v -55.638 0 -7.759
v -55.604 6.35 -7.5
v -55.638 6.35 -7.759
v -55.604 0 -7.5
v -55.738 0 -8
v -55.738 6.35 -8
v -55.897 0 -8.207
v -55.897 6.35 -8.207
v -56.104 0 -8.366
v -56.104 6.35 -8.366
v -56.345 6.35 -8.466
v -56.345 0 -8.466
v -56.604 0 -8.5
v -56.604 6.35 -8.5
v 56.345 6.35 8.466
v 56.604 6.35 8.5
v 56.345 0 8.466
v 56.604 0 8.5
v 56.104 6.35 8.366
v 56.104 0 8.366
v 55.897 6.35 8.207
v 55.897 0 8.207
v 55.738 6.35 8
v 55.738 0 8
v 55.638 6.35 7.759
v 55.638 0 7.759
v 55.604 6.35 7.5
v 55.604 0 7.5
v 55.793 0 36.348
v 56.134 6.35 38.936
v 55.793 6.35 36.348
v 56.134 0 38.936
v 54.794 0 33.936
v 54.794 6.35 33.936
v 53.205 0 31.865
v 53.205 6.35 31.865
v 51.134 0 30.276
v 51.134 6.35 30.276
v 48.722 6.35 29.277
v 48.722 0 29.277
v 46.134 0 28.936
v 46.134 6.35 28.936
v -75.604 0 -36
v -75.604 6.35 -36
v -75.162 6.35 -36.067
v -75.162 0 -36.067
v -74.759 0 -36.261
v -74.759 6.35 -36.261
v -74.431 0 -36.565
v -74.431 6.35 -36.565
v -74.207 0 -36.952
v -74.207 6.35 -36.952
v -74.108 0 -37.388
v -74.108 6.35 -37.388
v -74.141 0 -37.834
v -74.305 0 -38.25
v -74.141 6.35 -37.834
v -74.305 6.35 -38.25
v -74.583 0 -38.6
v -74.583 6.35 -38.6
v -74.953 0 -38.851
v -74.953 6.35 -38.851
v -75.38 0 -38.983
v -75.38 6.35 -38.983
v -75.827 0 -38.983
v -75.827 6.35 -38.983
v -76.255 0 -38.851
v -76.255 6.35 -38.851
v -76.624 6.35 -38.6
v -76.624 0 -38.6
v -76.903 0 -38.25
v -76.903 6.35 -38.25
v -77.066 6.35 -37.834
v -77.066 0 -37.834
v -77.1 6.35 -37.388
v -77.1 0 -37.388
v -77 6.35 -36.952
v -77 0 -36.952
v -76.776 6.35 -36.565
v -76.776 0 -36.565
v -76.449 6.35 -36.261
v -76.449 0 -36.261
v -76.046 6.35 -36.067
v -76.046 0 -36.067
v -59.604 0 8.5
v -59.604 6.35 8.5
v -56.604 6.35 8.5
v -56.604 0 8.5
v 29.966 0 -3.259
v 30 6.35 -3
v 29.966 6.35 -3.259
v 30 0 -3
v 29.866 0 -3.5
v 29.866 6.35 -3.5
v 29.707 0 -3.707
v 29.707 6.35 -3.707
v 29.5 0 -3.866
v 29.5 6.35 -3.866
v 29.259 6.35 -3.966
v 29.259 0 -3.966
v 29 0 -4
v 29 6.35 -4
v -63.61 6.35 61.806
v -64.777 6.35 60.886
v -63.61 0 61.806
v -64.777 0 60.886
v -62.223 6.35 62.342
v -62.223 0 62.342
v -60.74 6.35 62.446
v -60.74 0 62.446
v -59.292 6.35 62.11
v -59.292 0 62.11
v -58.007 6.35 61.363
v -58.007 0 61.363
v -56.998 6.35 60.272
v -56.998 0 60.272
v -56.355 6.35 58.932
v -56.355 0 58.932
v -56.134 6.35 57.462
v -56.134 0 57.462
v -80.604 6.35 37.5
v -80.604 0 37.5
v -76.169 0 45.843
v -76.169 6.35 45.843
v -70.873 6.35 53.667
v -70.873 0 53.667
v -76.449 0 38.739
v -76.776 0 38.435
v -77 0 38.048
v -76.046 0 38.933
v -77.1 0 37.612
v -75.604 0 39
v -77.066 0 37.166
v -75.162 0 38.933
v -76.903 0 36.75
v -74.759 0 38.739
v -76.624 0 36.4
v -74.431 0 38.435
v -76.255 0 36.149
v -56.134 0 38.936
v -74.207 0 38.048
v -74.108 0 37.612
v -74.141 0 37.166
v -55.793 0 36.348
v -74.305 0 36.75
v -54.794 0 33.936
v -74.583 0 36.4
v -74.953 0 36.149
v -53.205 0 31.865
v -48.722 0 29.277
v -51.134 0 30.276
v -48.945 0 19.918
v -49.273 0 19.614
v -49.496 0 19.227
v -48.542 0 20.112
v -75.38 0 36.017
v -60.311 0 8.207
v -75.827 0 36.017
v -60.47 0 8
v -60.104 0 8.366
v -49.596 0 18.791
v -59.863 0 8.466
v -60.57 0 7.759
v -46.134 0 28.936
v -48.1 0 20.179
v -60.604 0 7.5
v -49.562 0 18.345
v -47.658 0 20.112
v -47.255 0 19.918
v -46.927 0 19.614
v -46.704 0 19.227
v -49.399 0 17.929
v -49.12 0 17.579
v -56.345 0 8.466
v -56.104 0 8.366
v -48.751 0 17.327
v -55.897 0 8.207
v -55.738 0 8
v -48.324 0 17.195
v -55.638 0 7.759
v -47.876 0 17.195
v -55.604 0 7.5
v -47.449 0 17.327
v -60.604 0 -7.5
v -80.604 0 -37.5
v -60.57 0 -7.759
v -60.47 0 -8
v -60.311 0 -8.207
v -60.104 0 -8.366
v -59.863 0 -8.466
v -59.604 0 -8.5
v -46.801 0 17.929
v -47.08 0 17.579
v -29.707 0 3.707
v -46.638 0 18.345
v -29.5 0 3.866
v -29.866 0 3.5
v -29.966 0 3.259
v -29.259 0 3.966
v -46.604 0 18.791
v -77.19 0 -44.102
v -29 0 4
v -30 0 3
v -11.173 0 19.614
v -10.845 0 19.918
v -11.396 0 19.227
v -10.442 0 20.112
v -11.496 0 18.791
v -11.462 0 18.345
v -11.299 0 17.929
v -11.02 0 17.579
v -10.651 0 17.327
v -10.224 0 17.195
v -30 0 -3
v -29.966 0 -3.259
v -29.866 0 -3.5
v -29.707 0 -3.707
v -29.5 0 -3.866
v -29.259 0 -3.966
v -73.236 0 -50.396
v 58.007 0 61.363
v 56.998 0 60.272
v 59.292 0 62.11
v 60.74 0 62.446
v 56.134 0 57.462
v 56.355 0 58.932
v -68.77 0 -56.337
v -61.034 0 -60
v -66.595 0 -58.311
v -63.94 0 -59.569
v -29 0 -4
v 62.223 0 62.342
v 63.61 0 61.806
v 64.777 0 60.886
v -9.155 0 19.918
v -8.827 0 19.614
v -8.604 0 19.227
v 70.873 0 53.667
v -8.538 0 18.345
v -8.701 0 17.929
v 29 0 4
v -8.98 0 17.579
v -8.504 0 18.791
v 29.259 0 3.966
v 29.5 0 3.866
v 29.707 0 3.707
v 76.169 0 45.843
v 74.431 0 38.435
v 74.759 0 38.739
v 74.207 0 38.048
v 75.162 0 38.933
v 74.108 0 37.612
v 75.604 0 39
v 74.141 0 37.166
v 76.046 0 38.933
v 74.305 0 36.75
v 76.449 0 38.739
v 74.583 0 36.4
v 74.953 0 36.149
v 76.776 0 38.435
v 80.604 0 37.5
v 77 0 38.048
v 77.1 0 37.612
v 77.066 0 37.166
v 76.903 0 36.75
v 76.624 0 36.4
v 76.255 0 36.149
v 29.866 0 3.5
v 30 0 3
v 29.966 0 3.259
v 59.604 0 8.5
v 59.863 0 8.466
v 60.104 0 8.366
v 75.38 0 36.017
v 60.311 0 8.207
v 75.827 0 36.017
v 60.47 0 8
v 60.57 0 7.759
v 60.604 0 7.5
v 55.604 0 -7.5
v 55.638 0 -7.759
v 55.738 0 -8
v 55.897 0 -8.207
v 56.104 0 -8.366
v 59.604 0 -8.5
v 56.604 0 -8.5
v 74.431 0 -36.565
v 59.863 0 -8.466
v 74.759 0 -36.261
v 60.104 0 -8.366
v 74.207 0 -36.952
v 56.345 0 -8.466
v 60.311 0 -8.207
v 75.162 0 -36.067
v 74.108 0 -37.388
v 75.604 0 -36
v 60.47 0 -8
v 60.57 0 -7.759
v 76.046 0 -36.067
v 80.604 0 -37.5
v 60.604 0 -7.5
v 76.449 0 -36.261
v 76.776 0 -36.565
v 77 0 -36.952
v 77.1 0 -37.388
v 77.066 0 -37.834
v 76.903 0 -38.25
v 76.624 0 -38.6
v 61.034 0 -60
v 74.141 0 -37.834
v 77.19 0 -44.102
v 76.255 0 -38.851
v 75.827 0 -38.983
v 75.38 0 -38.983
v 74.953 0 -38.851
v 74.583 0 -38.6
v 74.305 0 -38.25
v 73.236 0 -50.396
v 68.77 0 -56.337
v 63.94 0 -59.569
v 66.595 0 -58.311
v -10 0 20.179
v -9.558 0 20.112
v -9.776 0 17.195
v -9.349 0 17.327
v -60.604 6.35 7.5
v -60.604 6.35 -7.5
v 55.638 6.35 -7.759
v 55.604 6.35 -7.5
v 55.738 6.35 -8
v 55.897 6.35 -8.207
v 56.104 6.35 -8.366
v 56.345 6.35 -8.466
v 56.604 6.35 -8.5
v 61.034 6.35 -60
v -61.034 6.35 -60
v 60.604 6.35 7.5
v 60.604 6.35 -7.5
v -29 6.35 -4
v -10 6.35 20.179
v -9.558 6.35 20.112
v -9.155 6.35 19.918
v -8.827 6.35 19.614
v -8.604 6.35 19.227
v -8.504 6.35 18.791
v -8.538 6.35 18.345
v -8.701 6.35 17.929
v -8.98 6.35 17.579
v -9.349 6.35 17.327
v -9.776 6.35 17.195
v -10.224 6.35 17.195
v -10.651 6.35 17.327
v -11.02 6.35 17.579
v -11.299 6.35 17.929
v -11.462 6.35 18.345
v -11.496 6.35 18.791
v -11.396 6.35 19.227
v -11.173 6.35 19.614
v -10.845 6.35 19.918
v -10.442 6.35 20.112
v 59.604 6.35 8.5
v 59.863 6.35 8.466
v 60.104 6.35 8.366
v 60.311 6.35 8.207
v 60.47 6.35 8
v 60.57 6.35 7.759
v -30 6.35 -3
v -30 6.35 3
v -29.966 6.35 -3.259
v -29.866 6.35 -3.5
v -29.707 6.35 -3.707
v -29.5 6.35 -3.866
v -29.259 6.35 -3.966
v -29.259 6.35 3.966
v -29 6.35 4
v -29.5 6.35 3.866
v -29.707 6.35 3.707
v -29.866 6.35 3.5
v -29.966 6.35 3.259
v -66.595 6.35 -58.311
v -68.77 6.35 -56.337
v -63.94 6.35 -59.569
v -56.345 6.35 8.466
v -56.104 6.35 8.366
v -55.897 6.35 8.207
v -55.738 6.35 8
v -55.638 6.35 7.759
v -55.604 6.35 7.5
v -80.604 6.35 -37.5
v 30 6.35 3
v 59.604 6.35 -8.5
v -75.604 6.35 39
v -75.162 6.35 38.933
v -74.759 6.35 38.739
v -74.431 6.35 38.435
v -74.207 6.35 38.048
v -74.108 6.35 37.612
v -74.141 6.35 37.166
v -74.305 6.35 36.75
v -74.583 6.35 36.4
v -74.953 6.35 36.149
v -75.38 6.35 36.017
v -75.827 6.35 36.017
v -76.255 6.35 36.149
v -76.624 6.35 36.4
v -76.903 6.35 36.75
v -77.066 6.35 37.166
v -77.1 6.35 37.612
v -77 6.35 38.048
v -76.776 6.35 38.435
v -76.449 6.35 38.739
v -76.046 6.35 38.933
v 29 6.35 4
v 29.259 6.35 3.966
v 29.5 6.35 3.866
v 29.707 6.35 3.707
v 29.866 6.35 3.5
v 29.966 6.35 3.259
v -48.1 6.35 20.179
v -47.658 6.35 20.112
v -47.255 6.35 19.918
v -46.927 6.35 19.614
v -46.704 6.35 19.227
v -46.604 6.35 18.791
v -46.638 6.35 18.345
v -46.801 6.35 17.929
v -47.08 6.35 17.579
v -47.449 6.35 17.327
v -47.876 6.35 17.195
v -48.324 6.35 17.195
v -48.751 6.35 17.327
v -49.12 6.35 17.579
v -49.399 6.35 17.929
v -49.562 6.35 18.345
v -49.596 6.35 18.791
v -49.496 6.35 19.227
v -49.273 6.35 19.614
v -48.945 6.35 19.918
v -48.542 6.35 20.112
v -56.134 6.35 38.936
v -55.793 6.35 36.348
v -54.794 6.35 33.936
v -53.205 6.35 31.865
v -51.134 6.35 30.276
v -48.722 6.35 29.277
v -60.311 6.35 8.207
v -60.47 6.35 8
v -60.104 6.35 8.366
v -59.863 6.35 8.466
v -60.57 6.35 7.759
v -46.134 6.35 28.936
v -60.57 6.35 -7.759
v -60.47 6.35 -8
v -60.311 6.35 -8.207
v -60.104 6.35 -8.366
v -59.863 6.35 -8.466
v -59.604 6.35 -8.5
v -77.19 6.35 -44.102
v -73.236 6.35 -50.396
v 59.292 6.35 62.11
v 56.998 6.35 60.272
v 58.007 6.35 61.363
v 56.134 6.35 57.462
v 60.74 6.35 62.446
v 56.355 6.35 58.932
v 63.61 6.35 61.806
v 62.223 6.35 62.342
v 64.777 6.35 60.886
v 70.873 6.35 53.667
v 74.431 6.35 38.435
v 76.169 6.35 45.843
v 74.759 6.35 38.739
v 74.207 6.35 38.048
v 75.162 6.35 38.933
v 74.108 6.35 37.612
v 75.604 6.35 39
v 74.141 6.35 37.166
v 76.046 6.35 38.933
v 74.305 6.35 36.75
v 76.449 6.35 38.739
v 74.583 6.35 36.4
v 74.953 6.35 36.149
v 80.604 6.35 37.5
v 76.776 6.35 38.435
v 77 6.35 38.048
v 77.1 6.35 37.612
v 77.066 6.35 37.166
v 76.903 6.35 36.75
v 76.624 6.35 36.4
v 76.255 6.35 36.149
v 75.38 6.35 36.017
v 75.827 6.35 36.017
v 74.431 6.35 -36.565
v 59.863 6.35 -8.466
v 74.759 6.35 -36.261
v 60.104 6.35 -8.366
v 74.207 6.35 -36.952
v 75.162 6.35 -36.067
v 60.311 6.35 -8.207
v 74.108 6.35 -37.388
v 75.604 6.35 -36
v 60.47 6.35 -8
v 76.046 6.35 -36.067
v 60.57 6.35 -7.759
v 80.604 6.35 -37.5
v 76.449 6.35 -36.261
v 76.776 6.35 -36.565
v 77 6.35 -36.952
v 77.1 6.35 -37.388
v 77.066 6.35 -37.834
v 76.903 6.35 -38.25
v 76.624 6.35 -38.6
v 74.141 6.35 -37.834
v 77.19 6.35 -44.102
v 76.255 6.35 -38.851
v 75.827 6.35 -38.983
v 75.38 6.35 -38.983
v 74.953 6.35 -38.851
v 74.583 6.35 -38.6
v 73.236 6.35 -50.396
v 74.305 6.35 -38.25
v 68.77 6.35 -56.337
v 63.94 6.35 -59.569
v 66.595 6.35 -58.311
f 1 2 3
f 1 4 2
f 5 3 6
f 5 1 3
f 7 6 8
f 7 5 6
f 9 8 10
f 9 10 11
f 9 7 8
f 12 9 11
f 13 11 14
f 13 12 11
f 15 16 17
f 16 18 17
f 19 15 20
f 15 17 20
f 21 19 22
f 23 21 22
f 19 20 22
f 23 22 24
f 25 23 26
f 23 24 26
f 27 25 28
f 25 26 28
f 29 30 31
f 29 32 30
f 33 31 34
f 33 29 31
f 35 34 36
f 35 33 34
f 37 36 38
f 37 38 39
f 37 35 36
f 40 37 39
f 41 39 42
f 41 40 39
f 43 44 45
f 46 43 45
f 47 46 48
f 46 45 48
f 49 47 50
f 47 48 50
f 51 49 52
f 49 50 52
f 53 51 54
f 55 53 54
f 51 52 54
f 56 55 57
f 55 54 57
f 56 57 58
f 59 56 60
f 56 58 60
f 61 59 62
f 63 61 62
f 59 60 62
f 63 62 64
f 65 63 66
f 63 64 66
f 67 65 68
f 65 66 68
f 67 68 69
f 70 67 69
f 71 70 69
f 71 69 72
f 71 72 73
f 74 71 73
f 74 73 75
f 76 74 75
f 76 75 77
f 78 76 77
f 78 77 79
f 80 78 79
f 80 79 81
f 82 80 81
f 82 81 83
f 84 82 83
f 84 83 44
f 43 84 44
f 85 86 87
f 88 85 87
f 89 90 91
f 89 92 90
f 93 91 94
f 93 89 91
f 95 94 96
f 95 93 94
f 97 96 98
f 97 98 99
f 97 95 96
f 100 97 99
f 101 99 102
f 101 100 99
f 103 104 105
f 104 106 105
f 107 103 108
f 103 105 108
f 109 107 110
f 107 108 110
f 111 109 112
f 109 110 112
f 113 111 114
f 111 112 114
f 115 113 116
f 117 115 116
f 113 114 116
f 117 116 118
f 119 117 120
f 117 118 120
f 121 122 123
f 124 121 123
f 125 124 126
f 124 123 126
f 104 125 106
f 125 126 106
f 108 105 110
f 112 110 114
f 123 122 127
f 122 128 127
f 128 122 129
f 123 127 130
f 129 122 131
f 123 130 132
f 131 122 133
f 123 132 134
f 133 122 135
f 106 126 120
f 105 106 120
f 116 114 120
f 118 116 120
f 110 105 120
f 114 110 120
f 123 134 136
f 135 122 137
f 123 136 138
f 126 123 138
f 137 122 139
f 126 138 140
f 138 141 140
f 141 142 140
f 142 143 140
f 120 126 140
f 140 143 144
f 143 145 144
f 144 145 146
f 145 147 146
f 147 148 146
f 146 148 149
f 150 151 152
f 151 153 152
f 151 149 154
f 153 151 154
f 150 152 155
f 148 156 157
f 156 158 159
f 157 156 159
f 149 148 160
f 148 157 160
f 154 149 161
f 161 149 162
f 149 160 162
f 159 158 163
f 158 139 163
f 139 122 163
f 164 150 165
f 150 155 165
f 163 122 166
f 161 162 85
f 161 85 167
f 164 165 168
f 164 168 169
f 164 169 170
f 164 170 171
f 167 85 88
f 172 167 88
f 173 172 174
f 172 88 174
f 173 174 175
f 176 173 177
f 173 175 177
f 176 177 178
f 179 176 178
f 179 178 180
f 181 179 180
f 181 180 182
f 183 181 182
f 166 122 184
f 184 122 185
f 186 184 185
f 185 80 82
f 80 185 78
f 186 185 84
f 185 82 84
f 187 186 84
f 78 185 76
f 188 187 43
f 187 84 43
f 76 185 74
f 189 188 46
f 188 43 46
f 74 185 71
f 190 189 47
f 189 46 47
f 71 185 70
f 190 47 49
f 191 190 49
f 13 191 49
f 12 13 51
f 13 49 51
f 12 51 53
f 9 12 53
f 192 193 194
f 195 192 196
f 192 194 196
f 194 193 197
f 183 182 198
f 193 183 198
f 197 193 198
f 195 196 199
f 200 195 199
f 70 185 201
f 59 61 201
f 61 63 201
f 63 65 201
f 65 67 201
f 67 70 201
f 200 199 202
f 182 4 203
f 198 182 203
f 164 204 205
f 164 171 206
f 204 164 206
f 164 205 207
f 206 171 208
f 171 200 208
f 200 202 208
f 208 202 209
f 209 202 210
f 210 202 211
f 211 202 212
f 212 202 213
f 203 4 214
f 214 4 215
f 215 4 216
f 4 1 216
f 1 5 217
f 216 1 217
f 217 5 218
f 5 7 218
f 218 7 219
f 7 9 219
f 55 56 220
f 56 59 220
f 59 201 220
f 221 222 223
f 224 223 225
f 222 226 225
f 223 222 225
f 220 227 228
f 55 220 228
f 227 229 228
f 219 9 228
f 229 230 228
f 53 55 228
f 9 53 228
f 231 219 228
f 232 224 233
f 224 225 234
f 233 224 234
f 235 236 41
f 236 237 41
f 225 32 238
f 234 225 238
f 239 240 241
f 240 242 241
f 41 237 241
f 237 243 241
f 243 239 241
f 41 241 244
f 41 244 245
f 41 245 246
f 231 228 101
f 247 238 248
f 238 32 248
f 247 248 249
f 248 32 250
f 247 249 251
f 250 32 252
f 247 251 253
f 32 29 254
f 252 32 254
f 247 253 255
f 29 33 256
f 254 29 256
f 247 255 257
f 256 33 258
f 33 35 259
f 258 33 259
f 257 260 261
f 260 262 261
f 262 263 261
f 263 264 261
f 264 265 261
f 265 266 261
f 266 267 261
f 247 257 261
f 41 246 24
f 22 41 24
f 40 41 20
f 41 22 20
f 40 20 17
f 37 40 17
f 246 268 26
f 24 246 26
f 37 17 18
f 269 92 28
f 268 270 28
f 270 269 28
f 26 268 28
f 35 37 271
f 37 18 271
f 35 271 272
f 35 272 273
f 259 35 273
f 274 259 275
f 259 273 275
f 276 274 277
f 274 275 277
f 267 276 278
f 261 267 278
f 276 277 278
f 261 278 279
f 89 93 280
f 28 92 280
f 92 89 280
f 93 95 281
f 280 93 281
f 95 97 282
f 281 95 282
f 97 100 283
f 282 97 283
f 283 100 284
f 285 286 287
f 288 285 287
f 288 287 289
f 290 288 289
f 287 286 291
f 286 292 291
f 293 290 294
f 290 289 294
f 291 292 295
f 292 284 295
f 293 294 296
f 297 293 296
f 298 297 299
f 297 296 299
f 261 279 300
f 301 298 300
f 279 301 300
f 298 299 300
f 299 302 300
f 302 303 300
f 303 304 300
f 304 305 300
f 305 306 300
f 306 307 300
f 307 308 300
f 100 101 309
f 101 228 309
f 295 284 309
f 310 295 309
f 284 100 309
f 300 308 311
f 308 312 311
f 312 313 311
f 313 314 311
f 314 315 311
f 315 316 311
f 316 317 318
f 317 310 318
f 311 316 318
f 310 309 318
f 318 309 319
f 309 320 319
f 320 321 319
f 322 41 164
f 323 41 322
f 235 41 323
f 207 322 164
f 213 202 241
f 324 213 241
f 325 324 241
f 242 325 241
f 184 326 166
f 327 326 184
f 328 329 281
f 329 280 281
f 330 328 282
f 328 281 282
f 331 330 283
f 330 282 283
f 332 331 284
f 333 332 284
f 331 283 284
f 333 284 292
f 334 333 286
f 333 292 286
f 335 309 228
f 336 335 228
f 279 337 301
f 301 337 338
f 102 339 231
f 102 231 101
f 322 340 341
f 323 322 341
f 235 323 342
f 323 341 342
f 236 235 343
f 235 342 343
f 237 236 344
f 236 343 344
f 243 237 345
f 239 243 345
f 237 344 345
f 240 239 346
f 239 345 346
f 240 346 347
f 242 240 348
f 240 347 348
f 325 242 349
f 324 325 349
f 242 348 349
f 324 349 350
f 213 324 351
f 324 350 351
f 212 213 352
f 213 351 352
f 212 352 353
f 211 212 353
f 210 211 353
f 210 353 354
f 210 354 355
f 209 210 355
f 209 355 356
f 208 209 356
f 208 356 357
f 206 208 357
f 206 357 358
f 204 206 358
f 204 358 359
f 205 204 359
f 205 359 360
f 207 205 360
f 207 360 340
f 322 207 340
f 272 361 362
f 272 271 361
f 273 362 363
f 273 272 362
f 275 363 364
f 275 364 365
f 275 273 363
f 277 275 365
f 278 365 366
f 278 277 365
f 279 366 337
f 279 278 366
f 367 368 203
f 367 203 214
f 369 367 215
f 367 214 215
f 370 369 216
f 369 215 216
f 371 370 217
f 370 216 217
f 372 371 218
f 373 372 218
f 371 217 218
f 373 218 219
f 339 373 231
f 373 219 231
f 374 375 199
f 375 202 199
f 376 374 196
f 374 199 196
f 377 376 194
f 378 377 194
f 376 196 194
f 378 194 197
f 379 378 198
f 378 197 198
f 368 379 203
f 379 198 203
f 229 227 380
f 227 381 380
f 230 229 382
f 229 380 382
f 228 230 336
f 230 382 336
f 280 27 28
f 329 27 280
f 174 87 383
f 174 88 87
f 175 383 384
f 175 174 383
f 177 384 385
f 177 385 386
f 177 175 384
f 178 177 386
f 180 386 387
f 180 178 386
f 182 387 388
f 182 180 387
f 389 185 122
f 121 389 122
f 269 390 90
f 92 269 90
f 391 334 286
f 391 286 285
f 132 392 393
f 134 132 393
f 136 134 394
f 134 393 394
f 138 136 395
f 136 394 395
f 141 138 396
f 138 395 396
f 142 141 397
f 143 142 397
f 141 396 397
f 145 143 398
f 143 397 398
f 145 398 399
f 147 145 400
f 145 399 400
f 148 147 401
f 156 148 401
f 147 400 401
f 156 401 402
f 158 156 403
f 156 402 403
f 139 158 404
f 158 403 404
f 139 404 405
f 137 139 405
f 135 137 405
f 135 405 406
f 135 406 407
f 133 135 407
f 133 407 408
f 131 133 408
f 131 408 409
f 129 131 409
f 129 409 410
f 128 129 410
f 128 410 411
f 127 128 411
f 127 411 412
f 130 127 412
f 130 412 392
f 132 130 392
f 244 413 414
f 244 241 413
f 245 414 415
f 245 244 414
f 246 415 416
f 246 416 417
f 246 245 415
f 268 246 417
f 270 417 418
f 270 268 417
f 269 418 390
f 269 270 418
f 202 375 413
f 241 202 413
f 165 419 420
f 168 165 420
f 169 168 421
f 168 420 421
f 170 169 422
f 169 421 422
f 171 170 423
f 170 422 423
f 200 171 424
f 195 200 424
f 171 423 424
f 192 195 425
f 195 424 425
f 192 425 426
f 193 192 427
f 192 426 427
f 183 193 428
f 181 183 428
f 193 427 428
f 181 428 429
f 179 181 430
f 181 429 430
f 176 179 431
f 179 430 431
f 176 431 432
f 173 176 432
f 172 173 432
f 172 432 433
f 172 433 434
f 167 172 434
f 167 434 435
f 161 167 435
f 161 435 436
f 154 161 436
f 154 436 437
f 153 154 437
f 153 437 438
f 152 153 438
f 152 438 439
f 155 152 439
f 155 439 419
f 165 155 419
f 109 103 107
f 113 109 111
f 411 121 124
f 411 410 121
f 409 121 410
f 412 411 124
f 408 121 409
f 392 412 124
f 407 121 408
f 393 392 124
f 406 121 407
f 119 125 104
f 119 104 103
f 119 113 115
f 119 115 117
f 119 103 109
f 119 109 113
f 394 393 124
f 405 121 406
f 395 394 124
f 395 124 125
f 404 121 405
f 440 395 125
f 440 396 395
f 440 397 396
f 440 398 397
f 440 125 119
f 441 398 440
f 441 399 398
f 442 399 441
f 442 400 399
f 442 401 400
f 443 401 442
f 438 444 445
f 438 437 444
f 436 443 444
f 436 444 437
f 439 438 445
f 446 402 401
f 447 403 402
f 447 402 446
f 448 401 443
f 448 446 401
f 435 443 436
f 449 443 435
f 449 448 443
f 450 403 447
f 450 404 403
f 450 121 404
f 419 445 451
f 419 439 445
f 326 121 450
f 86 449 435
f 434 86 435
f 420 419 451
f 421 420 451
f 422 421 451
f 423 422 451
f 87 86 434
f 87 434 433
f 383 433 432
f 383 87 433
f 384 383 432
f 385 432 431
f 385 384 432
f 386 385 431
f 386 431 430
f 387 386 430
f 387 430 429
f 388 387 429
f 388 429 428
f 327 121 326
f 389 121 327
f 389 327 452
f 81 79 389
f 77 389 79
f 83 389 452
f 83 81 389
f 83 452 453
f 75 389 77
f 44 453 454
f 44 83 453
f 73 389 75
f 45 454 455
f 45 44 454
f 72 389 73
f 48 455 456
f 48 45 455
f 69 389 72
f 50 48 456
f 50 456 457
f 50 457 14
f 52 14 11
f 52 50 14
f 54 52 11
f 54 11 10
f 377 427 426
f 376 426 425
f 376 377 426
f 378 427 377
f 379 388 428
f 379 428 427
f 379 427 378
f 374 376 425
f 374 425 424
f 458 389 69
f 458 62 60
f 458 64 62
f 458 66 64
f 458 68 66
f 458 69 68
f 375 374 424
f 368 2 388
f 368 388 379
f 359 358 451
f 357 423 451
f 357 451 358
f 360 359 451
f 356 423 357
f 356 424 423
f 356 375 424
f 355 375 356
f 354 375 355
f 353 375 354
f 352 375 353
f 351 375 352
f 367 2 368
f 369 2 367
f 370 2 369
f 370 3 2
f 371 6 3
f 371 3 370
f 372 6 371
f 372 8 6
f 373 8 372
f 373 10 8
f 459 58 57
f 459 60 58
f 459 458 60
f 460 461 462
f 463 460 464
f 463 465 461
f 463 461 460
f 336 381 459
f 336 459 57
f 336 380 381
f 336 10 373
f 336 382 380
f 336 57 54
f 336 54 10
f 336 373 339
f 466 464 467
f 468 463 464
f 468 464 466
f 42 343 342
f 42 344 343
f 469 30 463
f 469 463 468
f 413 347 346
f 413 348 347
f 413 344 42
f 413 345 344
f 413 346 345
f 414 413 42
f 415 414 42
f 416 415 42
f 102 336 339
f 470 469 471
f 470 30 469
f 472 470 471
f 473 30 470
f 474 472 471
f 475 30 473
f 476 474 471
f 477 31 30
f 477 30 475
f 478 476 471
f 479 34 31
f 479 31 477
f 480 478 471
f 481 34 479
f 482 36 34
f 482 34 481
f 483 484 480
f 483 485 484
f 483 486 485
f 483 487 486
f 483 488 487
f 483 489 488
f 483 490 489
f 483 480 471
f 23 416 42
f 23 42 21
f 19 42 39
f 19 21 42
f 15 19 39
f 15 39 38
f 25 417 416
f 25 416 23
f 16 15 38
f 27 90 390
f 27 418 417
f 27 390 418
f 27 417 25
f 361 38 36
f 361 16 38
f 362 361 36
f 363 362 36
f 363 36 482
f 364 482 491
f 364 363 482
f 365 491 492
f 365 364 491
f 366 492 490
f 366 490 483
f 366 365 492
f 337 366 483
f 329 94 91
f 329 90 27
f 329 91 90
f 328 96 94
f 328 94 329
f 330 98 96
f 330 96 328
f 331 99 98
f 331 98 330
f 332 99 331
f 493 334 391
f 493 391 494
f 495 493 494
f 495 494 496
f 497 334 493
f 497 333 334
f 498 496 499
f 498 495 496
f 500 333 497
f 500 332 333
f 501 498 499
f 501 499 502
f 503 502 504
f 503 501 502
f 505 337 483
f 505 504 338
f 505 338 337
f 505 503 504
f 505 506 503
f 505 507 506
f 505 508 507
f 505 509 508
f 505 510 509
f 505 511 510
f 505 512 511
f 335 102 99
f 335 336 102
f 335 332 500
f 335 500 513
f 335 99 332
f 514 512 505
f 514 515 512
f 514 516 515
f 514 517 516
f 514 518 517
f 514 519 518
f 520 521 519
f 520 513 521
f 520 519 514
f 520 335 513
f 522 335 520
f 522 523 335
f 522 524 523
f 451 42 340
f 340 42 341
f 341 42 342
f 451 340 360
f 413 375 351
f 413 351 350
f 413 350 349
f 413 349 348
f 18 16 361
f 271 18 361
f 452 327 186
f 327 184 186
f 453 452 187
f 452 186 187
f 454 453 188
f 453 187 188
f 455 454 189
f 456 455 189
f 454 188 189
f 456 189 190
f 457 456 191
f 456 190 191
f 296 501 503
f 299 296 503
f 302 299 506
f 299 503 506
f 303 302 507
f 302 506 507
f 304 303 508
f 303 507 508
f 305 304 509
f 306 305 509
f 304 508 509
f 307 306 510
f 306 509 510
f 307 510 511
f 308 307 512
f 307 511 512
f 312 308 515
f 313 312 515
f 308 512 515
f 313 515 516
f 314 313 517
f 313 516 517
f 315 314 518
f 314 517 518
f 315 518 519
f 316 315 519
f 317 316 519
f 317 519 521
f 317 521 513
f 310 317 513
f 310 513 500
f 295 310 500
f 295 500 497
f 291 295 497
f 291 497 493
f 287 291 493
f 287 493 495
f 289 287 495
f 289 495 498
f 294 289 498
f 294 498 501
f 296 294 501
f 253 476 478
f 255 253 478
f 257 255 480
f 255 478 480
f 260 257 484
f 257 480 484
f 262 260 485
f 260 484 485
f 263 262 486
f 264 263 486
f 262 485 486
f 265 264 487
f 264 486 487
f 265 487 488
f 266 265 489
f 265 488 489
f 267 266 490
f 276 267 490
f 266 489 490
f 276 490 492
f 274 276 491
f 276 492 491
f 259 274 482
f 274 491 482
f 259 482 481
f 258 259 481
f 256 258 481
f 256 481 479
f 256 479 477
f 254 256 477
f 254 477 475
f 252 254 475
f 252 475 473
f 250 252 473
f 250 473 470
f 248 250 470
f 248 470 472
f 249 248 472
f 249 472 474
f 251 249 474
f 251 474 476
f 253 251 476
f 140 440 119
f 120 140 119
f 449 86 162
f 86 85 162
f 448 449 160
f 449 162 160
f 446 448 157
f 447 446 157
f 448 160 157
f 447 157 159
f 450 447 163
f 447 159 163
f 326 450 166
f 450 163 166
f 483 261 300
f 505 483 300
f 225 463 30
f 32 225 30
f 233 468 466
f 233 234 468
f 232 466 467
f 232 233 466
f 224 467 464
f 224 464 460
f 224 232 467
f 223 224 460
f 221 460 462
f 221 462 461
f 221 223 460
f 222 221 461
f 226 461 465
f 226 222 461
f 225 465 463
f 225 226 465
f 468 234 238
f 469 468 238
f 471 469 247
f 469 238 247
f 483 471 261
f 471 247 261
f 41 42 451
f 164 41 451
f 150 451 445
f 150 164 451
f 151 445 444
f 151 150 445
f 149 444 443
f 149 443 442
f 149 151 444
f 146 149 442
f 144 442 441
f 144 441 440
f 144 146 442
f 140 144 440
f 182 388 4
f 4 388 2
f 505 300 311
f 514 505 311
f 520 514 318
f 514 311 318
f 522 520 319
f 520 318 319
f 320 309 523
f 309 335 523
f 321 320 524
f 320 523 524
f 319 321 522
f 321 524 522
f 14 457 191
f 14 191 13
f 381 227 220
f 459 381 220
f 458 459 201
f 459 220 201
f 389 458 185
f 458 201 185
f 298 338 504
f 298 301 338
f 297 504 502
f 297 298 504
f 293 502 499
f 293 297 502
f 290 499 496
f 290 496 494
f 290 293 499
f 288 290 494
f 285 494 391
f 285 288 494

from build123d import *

# Parameters (mm, degrees)
MAIN_BODY_DEPTH    = 6.35
SKETCH6_R          = 1.524
FRONT_IR_DEPTH     = 121.168600308
SKETCH10_W         = 38.1
SKETCH10_H         = 25.908
GRABBER_SLOT_DEPTH = 121.168600308
SKETCH11_W         = 5
SKETCH11_H         = 17
SKETCH11_W_2       = 60
SKETCH11_H_2       = 8
WIRE_SLOTS_DEPTH   = 121.168600308
SKETCH13_R         = 1.5
F_2ND_LEVEL_DEPTH  = 121.168600308
CUT_EXTRUDE1_DEPTH = 121.168600308
FILLET1_R          = 5
FILLET2_R          = 10
CUT_EXTRUDE2_START = -10
CUT_EXTRUDE2_DEPTH = 10
FILLET3_R          = 10
FILLET4_R          = 1
SKETCH17_R         = 1.5
CUT_EXTRUDE3_DEPTH = 103.170168296


with BuildPart() as part:
    # Sketch1 → Main Body (new body)
    with BuildSketch(Plane(origin=(0, 0, 0), x_dir=(1, 0, 0), z_dir=(0, 1, 0))):
        with BuildLine():
            Line((-80.603721998, 37.5), (-80.603721998, -37.5))
            ThreePointArc((-80.603721998, -37.5), (0, -88.9), (80.603721998, -37.5))
            Line((80.603721998, -37.5), (80.603721998, 37.5))
            ThreePointArc((80.603721998, 37.5), (0, 88.9), (-80.603721998, 37.5))
        make_face()
    extrude(amount=MAIN_BODY_DEPTH)

    # Sketch6 → Front IR (cut, through all)
    with BuildSketch(Plane(origin=(0, 6.35, 0), x_dir=(1, 0, 0), z_dir=(0, 1, 0))):
        with Locations(Location((-12.7, -69.596, 0), (0, 0, 270))):
            Circle(SKETCH6_R)
        with Locations(Location((12.7, -69.596, 0), (0, 0, 270))):
            Circle(SKETCH6_R)
    extrude(amount=-FRONT_IR_DEPTH, mode=Mode.SUBTRACT)

    # Sketch10 → Grabber slot (cut, through all)
    with BuildSketch(Plane(origin=(0, 6.35, 0), x_dir=(1, 0, 0), z_dir=(0, 1, 0))):
        with Locations((0, -88.9)):
            Rectangle(SKETCH10_W, SKETCH10_H)
    extrude(amount=-GRABBER_SLOT_DEPTH, mode=Mode.SUBTRACT)

    # Sketch11 → Wire slots (cut, through all)
    with BuildSketch(Plane(origin=(0, 6.35, 0), x_dir=(1, 0, 0), z_dir=(0, 1, 0))):
        with Locations((-58.103721998, 0)):
            Rectangle(SKETCH11_W, SKETCH11_H)
        Rectangle(SKETCH11_W_2, SKETCH11_H_2)
        with Locations((58.103721998, 0)):
            Rectangle(SKETCH11_W, SKETCH11_H)
    extrude(amount=-WIRE_SLOTS_DEPTH, mode=Mode.SUBTRACT)

    # Sketch13 → 2nd level (cut, through all)
    with BuildSketch(Plane(origin=(0, 6.35, 0), x_dir=(1, 0, 0), z_dir=(0, 1, 0))):
        with Locations(Location((75.603721998, -37.5, 0), (0, 0, 270))):
            Circle(SKETCH13_R)
        with Locations(Location((-75.603721998, -37.5, 0), (0, 0, 270))):
            Circle(SKETCH13_R)
        with Locations(Location((75.603721998, 37.5, 0), (0, 0, 270))):
            Circle(SKETCH13_R)
        with Locations(Location((-75.603721998, 37.5, 0), (0, 0, 270))):
            Circle(SKETCH13_R)
    extrude(amount=-F_2ND_LEVEL_DEPTH, mode=Mode.SUBTRACT)

    # Sketch14 → Cut-Extrude1 (cut, through all)
    with BuildSketch(Plane(origin=(0, 6.35, 0), x_dir=(1, 0, 0), z_dir=(0, 1, 0))):
        with BuildLine():
            Line((56.134, -68.93608666), (56.134, -28.93608666))
            Line((56.134, -28.93608666), (-56.134, -28.93608666))
            Line((-56.134, -28.93608666), (-56.134, -68.93608666))
            ThreePointArc((-56.134, -68.93608666), (-38.642602624, -80.062221194), (-19.05, -86.834944003))
            Line((-19.05, -86.834944003), (-19.05, -75.946))
            Line((-19.05, -75.946), (19.05, -75.946))
            Line((19.05, -75.946), (19.05, -86.834944003))
            ThreePointArc((19.05, -86.834944003), (38.642602624, -80.062221194), (56.134, -68.93608666))
        make_face()
    extrude(amount=-CUT_EXTRUDE1_DEPTH, mode=Mode.SUBTRACT)

    # Fillet1
    fillet1_edges = [part.edges().sort_by_distance(p)[0] for p in [
        (56.134, 3.175, 68.93608666),
        (-56.134, 3.175, 68.93608666),
    ]]
    fillet(fillet1_edges, radius=FILLET1_R)

    # Fillet2
    fillet2_edges = [part.edges().sort_by_distance(p)[0] for p in [
        (-56.134, 3.175, 28.93608666),
        (56.134, 3.175, 28.93608666),
    ]]
    fillet(fillet2_edges, radius=FILLET2_R)

    # Sketch16 → Cut-Extrude2 (cut)
    with BuildSketch(Plane(origin=(0, 6.35, 0), x_dir=(1, 0, 0), z_dir=(0, 1, 0)).offset(CUT_EXTRUDE2_START)):
        with BuildLine():
            Line((65.598856697, 60), (-65.598856697, 60))
            ThreePointArc((-65.598856697, 60), (0, 88.9), (65.598856697, 60))
        make_face()
    extrude(amount=CUT_EXTRUDE2_DEPTH, mode=Mode.SUBTRACT)

    # Fillet3
    fillet3_edges = [part.edges().sort_by_distance(p)[0] for p in [
        (-65.598856697, 3.175, -60),
        (65.598856697, 3.175, -60),
    ]]
    fillet(fillet3_edges, radius=FILLET3_R)

    # Fillet4
    fillet4_edges = [part.edges().sort_by_distance(p)[0] for p in [
        (-30, 3.175, 4),
        (-30, 3.175, -4),
        (30, 3.175, -4),
        (30, 3.175, 4),
        (55.603721998, 3.175, 8.5),
        (55.603721998, 3.175, -8.5),
        (60.603721998, 3.175, -8.5),
        (60.603721998, 3.175, 8.5),
        (-60.603721998, 3.175, 8.5),
        (-60.603721998, 3.175, -8.5),
        (-55.603721998, 3.175, -8.5),
        (-55.603721998, 3.175, 8.5),
    ]]
    fillet(fillet4_edges, radius=FILLET4_R)

    # Sketch17 → Cut-Extrude3 (cut, through all)
    with BuildSketch(Plane(origin=(0, 6.35, 0), x_dir=(1, 0, 0), z_dir=(0, 1, 0))):
        with Locations(Location((-48.1, -18.678710205, 0), (0, 0, 270))):
            Circle(SKETCH17_R)
        with Locations(Location((-10, -18.678710205, 0), (0, 0, 270))):
            Circle(SKETCH17_R)
    extrude(amount=-CUT_EXTRUDE3_DEPTH, mode=Mode.SUBTRACT)


solid = part.part
